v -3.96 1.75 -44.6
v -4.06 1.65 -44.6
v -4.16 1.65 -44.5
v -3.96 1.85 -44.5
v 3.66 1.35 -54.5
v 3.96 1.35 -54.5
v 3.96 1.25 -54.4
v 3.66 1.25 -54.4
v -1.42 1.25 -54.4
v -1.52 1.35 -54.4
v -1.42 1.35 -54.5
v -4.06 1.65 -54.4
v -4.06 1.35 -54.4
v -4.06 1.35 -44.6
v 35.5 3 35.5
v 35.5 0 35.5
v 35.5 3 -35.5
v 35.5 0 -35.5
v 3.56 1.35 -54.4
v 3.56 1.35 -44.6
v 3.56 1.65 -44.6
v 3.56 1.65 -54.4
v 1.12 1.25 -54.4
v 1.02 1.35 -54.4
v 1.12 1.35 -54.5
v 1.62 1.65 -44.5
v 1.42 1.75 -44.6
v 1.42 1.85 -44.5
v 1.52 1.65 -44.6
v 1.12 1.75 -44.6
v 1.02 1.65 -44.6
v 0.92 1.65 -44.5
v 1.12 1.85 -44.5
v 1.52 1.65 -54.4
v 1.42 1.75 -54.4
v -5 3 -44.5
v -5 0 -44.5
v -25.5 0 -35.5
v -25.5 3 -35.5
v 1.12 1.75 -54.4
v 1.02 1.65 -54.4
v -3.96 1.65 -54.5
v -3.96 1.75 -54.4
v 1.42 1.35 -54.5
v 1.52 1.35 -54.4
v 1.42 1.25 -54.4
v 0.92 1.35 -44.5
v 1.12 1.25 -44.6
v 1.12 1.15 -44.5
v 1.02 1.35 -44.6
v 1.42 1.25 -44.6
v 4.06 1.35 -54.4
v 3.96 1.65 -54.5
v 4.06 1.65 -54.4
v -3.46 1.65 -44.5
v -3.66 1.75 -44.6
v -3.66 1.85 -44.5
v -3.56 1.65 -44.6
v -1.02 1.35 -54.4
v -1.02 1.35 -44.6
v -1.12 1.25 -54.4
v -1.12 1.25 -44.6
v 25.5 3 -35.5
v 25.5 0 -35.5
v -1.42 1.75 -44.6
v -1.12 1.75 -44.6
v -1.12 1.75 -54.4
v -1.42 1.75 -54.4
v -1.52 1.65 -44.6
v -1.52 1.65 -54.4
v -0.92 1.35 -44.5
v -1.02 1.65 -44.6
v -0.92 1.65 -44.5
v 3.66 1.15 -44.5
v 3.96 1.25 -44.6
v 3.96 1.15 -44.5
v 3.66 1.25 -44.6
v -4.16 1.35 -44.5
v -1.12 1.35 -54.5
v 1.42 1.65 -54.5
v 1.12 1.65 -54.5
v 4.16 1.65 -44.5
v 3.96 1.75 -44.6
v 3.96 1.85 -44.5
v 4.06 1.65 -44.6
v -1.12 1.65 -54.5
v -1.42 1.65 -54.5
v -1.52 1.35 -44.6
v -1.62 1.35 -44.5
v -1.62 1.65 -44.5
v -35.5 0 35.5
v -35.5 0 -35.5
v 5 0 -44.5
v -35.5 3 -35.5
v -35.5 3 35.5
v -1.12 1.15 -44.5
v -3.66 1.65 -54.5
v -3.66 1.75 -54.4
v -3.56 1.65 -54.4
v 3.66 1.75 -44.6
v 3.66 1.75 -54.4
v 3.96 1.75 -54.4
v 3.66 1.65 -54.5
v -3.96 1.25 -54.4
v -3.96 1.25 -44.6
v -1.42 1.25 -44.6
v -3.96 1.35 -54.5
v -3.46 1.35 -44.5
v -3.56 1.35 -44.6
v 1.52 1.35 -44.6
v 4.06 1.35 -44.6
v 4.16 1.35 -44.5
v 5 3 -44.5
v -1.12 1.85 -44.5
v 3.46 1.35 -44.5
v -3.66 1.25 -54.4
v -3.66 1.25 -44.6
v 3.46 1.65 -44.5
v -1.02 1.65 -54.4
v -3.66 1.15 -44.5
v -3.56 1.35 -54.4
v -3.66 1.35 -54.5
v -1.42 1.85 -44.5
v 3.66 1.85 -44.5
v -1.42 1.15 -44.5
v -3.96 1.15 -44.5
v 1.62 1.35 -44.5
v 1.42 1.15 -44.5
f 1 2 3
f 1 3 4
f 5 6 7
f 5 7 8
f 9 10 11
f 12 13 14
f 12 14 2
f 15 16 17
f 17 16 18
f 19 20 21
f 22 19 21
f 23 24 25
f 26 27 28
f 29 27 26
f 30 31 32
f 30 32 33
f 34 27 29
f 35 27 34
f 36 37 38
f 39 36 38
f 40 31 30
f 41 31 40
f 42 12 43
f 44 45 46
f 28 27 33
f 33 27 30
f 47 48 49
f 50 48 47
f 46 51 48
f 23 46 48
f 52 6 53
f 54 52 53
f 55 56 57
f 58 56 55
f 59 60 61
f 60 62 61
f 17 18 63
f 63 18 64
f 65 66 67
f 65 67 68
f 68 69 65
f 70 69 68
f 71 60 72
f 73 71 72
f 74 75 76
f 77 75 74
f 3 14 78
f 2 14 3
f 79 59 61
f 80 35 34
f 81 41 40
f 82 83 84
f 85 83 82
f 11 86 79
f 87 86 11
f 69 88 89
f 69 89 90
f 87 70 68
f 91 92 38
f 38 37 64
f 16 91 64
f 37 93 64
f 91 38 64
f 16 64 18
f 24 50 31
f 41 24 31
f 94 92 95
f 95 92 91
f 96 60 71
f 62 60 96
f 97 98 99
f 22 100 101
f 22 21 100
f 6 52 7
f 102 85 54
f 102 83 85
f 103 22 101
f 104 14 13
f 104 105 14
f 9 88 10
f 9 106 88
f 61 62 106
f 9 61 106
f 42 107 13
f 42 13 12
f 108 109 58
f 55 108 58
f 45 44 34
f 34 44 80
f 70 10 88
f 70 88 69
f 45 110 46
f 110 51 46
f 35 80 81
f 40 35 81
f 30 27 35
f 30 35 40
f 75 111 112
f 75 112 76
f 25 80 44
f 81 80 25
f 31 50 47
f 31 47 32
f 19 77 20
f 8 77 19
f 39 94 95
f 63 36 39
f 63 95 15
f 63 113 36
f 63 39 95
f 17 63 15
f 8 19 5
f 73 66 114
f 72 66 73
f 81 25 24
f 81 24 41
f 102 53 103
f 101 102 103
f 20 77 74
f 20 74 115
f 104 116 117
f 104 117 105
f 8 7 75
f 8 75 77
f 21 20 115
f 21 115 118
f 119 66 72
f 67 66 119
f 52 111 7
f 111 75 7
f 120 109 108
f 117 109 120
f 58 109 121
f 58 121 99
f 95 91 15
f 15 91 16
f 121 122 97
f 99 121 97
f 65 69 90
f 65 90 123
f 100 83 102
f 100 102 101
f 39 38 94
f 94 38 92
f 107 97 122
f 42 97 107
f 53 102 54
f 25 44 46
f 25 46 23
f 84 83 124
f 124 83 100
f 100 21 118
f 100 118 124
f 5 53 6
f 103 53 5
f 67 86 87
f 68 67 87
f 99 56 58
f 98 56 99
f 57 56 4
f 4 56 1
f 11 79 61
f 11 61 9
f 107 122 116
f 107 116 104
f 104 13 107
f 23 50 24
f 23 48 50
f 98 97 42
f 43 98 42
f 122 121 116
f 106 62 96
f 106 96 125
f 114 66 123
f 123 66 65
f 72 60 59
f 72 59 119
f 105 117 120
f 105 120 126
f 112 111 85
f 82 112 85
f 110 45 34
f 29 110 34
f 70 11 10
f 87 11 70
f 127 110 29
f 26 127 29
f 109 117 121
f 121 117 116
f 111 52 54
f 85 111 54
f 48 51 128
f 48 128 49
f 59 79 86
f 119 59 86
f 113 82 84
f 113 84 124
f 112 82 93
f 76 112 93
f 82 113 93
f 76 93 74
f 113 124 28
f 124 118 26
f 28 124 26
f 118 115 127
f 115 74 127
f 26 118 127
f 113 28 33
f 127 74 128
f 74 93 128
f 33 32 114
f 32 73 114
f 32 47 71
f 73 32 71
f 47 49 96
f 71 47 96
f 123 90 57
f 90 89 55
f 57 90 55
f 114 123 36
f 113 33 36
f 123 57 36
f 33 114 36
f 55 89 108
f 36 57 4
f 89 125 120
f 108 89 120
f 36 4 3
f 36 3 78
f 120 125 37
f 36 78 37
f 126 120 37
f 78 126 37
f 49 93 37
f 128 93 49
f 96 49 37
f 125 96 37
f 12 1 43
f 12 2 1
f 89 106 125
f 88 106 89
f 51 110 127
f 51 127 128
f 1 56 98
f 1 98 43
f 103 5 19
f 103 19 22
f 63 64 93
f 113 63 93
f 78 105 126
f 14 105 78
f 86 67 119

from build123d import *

# Parameters (mm, degrees)
BOSS_EXTRUDE1_DEPTH = 3
SKETCH2_W           = 0.5
SKETCH2_H           = 0.5
BOSS_EXTRUDE2_DEPTH = 10
CHAMFER1_SIZE       = 0.1


with BuildPart() as part:
    # Sketch1 → Boss-Extrude1 (new body)
    with BuildSketch(Plane(origin=(0, 0, 0), x_dir=(1, 0, 0), z_dir=(0, 1, 0))):
        Polygon((-5, 44.5), (-25.5, 35.5), (25.5, 35.5), (5, 44.5), align=None)
        Polygon((-25.5, 35.5), (-35.5, 35.5), (-35.5, -35.5), (35.5, -35.5), (35.5, 35.5), (25.5, 35.5), align=None)
    extrude(amount=BOSS_EXTRUDE1_DEPTH)

    # Sketch2 → Boss-Extrude2 (add)
    with BuildSketch(Plane(origin=(0, 0, -44.5), x_dir=(-1, 0, 0), z_dir=(0, 0, -1))):
        with Locations((-3.81, 1.5)):
            Rectangle(SKETCH2_W, SKETCH2_H)
        with Locations((-1.27, 1.5)):
            Rectangle(SKETCH2_W, SKETCH2_H)
        with Locations((1.27, 1.5)):
            Rectangle(SKETCH2_W, SKETCH2_H)
        with Locations((3.81, 1.5)):
            Rectangle(SKETCH2_W, SKETCH2_H)
    extrude(amount=BOSS_EXTRUDE2_DEPTH)

    # Chamfer1
    chamfer1_edges = [part.edges().sort_by_distance(p)[0] for p in [
        (3.56, 1.5, -44.5),
        (3.56, 1.25, -49.5),
        (3.81, 1.75, -44.5),
        (3.56, 1.75, -49.5),
        (4.06, 1.5, -44.5),
        (4.06, 1.75, -49.5),
        (3.81, 1.25, -44.5),
        (4.06, 1.25, -49.5),
        (3.56, 1.5, -54.5),
        (3.81, 1.75, -54.5),
        (4.06, 1.5, -54.5),
        (3.81, 1.25, -54.5),
        (1.02, 1.5, -44.5),
        (1.02, 1.25, -49.5),
        (1.27, 1.75, -44.5),
        (1.02, 1.75, -49.5),
        (1.52, 1.5, -44.5),
        (1.52, 1.75, -49.5),
        (1.27, 1.25, -44.5),
        (1.52, 1.25, -49.5),
        (1.02, 1.5, -54.5),
        (1.27, 1.75, -54.5),
        (1.52, 1.5, -54.5),
        (1.27, 1.25, -54.5),
        (-1.52, 1.5, -44.5),
        (-1.52, 1.25, -49.5),
        (-1.27, 1.75, -44.5),
        (-1.52, 1.75, -49.5),
        (-1.02, 1.5, -44.5),
        (-1.02, 1.75, -49.5),
        (-1.27, 1.25, -44.5),
        (-1.02, 1.25, -49.5),
        (-1.52, 1.5, -54.5),
        (-1.27, 1.75, -54.5),
        (-1.02, 1.5, -54.5),
        (-1.27, 1.25, -54.5),
        (-4.06, 1.5, -44.5),
        (-4.06, 1.25, -49.5),
        (-3.81, 1.75, -44.5),
        (-4.06, 1.75, -49.5),
        (-3.56, 1.5, -44.5),
        (-3.56, 1.75, -49.5),
        (-3.81, 1.25, -44.5),
        (-3.56, 1.25, -49.5),
        (-4.06, 1.5, -54.5),
        (-3.81, 1.75, -54.5),
        (-3.56, 1.5, -54.5),
        (-3.81, 1.25, -54.5),
    ]]
    chamfer(chamfer1_edges, length=CHAMFER1_SIZE)


solid = part.part
